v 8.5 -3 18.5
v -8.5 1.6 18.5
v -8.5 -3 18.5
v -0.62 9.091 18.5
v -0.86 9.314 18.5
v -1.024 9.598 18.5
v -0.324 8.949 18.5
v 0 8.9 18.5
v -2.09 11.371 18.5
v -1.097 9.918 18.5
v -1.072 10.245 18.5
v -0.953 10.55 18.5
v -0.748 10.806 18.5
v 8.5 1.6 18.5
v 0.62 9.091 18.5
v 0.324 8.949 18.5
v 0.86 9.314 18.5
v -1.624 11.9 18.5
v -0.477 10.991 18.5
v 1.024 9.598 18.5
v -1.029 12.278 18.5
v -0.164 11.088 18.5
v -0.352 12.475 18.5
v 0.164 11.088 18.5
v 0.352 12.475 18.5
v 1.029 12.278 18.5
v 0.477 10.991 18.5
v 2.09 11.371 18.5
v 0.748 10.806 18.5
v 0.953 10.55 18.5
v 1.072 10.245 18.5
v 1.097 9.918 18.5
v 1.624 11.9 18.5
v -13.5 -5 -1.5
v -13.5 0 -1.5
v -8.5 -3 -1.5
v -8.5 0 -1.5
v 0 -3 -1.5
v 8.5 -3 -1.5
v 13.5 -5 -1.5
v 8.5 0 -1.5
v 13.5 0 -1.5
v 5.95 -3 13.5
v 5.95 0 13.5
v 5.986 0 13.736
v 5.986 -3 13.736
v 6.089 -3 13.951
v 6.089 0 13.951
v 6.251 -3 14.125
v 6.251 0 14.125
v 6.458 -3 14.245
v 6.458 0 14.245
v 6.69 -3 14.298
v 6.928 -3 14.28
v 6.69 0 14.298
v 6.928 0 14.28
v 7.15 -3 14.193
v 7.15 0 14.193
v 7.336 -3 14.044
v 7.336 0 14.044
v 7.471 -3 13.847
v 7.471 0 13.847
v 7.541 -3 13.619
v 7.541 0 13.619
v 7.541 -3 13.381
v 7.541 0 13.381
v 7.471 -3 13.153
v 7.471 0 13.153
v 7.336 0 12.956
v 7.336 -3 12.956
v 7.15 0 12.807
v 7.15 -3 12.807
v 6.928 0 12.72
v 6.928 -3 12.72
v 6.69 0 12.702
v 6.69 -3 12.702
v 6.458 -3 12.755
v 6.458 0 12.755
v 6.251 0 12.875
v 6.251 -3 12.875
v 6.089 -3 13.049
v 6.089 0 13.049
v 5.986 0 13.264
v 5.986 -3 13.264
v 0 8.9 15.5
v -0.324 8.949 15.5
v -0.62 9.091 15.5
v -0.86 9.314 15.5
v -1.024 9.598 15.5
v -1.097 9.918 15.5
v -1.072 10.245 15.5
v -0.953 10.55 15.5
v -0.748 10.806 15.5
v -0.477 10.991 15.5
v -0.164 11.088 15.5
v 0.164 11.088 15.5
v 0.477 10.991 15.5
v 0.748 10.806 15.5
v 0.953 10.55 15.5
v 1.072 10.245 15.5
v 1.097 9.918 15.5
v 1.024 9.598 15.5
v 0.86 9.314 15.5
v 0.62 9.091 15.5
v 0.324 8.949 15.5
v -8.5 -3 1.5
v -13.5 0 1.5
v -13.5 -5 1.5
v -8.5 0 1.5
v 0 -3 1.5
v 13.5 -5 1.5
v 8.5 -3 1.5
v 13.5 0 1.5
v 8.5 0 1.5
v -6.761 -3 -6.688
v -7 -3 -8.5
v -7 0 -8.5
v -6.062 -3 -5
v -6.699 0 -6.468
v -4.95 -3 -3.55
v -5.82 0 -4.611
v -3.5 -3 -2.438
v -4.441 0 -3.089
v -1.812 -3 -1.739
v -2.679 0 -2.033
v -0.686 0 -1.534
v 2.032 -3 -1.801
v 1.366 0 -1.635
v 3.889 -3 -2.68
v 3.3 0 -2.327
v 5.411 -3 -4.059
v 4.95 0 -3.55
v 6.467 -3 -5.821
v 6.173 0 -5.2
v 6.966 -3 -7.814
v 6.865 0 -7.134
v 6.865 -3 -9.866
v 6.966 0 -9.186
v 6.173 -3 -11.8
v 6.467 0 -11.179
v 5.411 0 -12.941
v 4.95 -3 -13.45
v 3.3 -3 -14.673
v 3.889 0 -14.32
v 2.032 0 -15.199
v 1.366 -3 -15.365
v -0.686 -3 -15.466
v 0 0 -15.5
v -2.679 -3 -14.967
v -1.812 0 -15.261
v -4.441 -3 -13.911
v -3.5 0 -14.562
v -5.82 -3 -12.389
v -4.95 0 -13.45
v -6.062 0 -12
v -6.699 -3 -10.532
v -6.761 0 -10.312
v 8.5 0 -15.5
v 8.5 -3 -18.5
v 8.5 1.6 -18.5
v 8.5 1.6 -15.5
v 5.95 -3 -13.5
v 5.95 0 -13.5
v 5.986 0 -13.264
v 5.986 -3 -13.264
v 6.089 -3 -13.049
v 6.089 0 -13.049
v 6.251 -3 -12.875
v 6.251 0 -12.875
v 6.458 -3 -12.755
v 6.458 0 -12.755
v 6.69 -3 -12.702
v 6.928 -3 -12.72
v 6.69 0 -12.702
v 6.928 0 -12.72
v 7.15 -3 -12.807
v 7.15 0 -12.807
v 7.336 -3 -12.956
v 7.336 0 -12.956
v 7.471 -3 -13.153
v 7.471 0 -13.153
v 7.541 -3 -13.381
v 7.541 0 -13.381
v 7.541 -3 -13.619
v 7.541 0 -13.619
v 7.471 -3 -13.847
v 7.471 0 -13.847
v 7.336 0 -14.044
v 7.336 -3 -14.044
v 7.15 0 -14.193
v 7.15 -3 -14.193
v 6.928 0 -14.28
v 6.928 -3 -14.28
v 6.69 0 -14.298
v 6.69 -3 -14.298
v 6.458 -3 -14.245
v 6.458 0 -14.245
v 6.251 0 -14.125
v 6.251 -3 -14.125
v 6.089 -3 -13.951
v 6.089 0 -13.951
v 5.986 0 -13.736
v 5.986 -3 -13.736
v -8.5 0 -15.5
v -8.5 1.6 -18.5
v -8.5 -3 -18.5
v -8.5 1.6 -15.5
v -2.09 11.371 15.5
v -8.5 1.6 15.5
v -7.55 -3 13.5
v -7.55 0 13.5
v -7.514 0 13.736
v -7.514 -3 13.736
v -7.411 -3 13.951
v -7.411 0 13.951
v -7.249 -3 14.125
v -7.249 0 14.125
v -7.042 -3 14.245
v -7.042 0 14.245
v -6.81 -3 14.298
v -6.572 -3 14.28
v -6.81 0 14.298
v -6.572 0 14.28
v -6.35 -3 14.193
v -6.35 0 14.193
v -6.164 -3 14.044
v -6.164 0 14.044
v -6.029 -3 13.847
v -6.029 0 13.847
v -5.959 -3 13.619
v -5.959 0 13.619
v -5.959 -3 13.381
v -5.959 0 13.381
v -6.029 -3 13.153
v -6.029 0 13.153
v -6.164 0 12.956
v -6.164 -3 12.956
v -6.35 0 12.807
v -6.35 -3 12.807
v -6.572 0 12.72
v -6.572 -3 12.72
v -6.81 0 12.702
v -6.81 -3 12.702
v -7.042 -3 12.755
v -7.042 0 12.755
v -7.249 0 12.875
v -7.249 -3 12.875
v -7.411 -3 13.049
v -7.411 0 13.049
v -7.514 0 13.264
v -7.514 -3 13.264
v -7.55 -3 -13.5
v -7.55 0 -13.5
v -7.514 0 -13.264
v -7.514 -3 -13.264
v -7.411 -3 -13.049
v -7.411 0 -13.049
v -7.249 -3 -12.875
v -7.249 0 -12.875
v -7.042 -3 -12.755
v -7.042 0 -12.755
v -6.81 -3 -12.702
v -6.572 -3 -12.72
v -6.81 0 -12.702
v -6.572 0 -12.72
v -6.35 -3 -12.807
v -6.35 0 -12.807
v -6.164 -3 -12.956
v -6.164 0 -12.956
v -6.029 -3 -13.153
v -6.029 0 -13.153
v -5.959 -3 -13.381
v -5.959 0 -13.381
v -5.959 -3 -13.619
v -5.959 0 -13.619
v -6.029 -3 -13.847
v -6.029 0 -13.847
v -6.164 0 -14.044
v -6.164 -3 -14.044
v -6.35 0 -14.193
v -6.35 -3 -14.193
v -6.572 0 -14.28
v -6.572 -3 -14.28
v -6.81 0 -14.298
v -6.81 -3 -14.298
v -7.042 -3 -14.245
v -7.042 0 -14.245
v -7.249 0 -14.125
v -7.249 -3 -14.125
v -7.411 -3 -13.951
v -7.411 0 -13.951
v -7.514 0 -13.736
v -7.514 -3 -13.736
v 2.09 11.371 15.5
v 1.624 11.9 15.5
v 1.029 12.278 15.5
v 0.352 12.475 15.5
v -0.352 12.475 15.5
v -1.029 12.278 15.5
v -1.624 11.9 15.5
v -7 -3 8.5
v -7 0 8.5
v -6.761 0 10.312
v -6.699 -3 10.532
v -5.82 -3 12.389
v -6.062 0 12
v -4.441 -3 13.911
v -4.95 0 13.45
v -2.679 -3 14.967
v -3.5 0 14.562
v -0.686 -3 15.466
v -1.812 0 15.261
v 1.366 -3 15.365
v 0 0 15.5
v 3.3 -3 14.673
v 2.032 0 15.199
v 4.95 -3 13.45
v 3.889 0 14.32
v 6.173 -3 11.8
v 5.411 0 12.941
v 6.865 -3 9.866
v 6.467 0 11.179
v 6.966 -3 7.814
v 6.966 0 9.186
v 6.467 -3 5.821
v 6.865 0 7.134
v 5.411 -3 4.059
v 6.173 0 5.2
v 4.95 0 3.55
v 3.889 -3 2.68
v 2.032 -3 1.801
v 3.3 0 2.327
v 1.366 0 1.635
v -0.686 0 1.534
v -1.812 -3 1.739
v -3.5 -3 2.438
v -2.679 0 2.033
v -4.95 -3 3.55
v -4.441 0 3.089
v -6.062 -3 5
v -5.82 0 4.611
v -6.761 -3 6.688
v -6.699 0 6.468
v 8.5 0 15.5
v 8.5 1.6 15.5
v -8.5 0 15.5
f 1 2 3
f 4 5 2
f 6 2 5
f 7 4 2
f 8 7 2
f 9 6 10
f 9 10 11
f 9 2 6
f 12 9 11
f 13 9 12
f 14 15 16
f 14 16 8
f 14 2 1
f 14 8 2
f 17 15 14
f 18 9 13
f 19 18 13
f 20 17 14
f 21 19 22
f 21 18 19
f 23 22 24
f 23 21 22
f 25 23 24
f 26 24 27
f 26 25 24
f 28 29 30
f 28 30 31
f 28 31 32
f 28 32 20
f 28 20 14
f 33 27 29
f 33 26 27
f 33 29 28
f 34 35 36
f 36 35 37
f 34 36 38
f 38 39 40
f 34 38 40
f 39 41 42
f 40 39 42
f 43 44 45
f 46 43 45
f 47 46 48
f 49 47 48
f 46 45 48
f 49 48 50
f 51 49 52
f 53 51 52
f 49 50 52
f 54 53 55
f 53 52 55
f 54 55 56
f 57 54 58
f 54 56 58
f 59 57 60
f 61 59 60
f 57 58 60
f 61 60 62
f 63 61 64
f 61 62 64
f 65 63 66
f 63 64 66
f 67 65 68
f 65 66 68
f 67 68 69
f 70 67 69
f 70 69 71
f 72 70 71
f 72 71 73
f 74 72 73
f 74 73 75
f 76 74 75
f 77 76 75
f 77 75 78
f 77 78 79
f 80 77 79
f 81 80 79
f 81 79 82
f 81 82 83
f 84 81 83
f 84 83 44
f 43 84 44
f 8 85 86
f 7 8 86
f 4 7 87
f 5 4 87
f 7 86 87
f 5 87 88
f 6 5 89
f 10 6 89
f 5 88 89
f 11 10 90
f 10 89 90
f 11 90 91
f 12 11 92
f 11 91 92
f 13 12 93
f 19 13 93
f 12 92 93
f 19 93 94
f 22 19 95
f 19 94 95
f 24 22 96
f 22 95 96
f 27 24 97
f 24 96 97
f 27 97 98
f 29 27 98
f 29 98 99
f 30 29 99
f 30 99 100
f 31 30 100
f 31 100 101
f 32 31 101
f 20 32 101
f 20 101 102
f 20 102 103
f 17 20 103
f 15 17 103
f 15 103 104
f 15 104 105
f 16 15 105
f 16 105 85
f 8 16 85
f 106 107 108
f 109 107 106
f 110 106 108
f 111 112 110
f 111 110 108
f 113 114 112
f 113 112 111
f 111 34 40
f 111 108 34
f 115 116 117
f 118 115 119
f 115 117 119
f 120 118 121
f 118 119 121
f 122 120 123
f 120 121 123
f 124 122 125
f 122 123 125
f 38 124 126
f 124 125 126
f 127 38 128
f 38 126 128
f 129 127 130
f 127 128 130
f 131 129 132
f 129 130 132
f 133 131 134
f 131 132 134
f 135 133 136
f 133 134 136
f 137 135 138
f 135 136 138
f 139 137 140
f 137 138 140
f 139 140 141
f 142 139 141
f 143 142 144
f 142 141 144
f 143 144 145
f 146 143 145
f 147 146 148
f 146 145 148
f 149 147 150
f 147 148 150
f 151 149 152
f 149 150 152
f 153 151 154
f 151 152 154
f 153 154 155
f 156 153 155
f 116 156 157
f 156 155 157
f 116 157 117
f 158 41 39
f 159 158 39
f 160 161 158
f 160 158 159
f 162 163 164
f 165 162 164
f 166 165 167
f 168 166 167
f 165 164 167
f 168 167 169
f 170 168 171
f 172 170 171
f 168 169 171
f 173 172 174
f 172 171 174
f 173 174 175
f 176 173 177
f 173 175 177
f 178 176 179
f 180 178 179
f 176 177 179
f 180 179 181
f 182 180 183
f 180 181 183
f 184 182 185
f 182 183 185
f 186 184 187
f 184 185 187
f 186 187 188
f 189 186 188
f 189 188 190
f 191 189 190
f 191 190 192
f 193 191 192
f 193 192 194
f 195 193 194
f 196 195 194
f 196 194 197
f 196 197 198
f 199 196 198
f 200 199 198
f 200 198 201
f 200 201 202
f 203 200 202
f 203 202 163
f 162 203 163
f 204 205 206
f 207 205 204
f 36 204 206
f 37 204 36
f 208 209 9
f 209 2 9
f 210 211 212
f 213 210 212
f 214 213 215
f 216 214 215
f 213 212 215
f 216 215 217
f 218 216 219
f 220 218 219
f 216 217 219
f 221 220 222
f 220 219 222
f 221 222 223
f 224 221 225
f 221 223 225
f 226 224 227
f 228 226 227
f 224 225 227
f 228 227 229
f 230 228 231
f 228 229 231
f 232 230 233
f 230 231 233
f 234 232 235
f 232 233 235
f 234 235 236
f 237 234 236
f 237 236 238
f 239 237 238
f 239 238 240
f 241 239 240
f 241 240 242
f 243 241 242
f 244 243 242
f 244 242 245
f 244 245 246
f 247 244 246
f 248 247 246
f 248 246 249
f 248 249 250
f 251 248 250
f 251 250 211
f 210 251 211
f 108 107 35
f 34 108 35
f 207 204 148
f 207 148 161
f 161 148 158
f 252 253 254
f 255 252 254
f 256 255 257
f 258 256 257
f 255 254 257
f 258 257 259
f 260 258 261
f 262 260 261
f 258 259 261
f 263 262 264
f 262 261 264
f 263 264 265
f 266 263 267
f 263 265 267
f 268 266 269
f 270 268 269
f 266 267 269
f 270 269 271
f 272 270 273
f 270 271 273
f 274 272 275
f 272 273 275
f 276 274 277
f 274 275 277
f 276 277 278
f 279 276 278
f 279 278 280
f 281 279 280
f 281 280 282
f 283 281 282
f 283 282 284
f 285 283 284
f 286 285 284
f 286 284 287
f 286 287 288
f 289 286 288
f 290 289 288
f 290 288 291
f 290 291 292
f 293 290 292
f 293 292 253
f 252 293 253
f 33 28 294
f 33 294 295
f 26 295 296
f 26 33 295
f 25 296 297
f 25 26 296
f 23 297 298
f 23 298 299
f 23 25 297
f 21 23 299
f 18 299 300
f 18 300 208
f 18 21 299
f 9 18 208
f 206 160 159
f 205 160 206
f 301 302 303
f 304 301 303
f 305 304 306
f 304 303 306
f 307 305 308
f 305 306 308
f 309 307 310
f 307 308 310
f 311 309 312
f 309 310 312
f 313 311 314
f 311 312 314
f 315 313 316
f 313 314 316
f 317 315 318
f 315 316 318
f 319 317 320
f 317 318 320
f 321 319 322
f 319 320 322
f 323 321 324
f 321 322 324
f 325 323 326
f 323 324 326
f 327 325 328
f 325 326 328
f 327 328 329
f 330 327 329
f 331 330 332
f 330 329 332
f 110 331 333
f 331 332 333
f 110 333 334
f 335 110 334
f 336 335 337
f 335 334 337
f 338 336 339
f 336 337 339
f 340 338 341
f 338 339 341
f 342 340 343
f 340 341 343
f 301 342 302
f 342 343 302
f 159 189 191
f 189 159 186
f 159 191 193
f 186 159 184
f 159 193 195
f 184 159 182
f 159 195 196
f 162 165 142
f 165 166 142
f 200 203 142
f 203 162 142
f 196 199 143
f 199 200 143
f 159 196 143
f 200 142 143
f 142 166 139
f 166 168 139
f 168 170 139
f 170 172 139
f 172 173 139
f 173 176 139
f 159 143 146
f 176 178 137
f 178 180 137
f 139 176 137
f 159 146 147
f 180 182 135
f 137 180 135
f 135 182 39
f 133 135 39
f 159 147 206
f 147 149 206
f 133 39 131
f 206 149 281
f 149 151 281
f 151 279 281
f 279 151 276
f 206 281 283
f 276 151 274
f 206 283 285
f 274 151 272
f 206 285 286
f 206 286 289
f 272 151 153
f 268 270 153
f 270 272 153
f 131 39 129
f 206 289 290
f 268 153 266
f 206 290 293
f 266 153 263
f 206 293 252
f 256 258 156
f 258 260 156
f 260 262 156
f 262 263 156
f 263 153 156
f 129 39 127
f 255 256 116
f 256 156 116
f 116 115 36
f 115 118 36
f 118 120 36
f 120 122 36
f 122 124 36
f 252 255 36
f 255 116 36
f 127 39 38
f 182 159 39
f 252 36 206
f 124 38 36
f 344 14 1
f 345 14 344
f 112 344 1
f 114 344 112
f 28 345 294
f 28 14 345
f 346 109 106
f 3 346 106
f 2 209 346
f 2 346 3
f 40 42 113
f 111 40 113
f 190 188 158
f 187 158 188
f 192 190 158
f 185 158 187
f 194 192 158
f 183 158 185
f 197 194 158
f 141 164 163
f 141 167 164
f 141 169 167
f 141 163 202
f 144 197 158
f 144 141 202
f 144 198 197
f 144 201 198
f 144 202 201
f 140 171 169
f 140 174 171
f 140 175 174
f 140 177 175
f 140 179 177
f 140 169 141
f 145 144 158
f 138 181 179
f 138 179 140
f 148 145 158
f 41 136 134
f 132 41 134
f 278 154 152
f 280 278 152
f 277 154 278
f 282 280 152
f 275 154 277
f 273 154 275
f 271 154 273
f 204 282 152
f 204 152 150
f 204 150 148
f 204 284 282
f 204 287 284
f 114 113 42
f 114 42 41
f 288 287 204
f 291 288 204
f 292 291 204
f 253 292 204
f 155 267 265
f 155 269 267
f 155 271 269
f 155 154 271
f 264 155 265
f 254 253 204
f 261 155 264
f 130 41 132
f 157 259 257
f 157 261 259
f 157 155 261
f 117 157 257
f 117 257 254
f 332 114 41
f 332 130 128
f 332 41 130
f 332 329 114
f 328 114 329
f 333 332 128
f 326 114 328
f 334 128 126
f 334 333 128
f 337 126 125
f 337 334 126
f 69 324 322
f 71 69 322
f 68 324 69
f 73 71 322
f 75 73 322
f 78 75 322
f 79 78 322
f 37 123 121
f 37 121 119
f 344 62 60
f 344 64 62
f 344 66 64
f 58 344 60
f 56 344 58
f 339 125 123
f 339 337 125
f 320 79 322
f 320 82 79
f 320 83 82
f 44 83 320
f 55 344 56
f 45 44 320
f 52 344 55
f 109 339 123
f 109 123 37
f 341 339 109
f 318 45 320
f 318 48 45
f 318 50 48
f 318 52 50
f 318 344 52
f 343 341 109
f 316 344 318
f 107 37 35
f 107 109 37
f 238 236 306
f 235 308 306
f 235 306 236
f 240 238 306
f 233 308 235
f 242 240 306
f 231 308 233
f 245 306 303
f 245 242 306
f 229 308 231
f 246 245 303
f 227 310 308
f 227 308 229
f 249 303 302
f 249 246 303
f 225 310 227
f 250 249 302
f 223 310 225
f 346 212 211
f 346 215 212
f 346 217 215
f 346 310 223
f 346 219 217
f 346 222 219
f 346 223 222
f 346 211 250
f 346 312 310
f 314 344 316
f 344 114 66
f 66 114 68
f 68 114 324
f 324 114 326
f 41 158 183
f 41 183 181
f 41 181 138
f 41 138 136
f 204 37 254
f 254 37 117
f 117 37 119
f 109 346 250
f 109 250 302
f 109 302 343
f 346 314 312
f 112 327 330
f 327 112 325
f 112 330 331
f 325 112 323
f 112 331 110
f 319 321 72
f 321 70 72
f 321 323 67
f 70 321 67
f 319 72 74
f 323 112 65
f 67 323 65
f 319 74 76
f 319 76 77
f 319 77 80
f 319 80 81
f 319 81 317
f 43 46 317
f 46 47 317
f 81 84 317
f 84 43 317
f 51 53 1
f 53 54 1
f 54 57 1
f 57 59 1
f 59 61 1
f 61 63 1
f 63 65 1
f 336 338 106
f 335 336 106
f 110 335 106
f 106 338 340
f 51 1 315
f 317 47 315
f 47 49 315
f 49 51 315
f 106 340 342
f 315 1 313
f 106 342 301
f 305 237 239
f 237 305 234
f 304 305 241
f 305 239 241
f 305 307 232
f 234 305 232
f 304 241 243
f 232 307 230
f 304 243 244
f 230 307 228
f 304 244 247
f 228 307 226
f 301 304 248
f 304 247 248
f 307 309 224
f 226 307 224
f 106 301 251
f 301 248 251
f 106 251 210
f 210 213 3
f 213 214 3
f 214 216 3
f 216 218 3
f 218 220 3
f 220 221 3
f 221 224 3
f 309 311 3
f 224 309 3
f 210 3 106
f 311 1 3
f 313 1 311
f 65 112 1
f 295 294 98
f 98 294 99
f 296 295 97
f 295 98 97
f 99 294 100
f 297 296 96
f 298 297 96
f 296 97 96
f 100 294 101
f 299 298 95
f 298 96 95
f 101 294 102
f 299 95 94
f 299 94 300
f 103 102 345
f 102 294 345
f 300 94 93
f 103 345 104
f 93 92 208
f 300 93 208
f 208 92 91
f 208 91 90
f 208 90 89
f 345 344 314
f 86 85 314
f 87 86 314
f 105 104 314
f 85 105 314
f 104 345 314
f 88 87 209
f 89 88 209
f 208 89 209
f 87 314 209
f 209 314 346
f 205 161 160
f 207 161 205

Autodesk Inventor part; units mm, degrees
ref_plane "YZ Plane" through (0, 0, 0) normal (1, 0, 0) x (0, 1, 0)
ref_plane "XZ Plane" through (0, 0, 0) normal (0, 1, 0) x (-1, 0, 0)
ref_plane "XY Plane" through (0, 0, 0) normal (0, 0, 1) x (1, 0, 0)
sketch "スケッチ1" plane through (0, 0, 0) normal (0, 1, 0) x (-1, 0, 0)
  line L0 (8.5, 15.5) -> (-8.5, 15.5) construction
  line L1 (-8.5, 15.5) -> (-8.5, -15.5)
  line L2 (-8.5, -15.5) -> (8.5, -15.5) construction
  line L3 (8.5, -15.5) -> (8.5, 15.5)
  circle A0 centre (0, 8.5) radius 7
  circle A1 centre (0, -8.5) radius 7
  circle A2 centre (6.75, -13.5) radius 0.8
  line L4 (6.75, -13.5) -> (-6.75, -13.5) construction
  line L5 (-6.75, -13.5) -> (-6.75, 13.5) construction
  line L6 (-6.75, 13.5) -> (6.75, 13.5) construction
  line L7 (6.75, 13.5) -> (6.75, -13.5) construction
  circle A3 centre (-6.75, -13.5) radius 0.8
  circle A4 centre (6.75, 13.5) radius 0.8
  circle A5 centre (-6.75, 13.5) radius 0.8
  line L8 (8.5, 18.5) -> (-8.5, 18.5)
  line L9 (-8.5, 18.5) -> (-8.5, 15.5)
  line L10 (-8.5, 15.5) -> (8.5, 15.5)
  line L11 (8.5, 15.5) -> (8.5, 18.5)
  line L12 (8.5, -15.5) -> (-8.5, -15.5)
  line L13 (-8.5, -15.5) -> (-8.5, -18.5)
  line L14 (-8.5, -18.5) -> (8.5, -18.5)
  line L15 (8.5, -18.5) -> (8.5, -15.5)
  line L16 (-6.75, 10.354) -> (-6.75, -10.354)
  line L17 (13.5, -1.5) -> (-13.5, -1.5)
  line L18 (-13.5, -1.5) -> (-13.5, 1.5)
  line L19 (-13.5, 1.5) -> (13.5, 1.5)
  line L20 (13.5, 1.5) -> (13.5, -1.5)
  point P0 (0, 0)
  point P1 (0, 0)
  point P2 (0, 15.5)
  point P3 (8.5, 0)
  point P4 (6.75, 0)
  point P5 (0, 13.5)
  point P6 (6.75, 10.354)
  point P7 (6.75, -10.354)
  point P8 (7, 8.5)
  point P9 (7, -8.5)
  point P10 (-7, 8.5)
  point P11 (-7, -8.5)
  point P12 (-6.75, -6.646)
  point P13 (-6.75, 6.646)
  point P14 (13.5, 0)
  point P15 (0, -1.5)
  point P16 (8.5, 1.5)
  point P17 (8.5, -1.5)
  point P18 (-8.5, -1.5)
  point P19 (-8.5, 1.5)
  dimension "d0" = 17
  dimension "d1" = 31
  dimension "d2" = 14
  dimension "d4" = 27
  dimension "d5" = 13.5
  dimension "d7" = 1.6
  dimension "d9" = 3
  dimension "d26" = 5
extrude "押し出し1" add sketch "スケッチ1" against normal blind 3 contours L10 A0 L16 L19 L1 | L9 L8 L11 L10 | L19 L16 L17 L1 | L1 L17 L18 L19 | L10 L3 L19 A0 | L17 L16 A1 L12 L1 | L19 L3 L17 L16 | L16 A0 L19 | L12 L15 L14 L13 | L17 A1 L16 | L19 L20 L17 L3 | A1 L17 L3 L12
extrude "押し出し2" add sketch "スケッチ1" along normal blind 1.6 contours L9 L8 L11 L10 | L12 L15 L14 L13
sketch "スケッチ4" plane through (0, -3, 0) normal (0, -1, 0) x (1, 0, 0)
  line L0 (-8.5, 1.5) -> (-13.5, 1.5) projected
  line L1 (-13.5, 1.5) -> (-13.5, -1.5) projected
  line L2 (-13.5, -1.5) -> (-8.5, -1.5) projected
  line L3 (8.5, -1.5) -> (13.5, -1.5) projected
  line L4 (13.5, -1.5) -> (13.5, 1.5) projected
  line L5 (13.5, 1.5) -> (8.5, 1.5) projected
  line L6 (-13.5, -1.5) -> (13.5, -1.5) projected
  line L7 (-8.5, 1.5) -> (-13.5, 1.5) projected
  line L8 (-13.5, 1.5) -> (13.5, 1.5)
  line L9 (13.5, 1.5) -> (13.5, -1.5)
  line L10 (13.5, -1.5) -> (-13.5, -1.5)
  line L11 (-13.5, -1.5) -> (-13.5, 1.5)
  point P0 (-7, -1.5)
  point P1 (7, -1.5)
  point P2 (7, 1.5)
  point P3 (-7, 1.5)
  point P4 (0, 0)
  point P5 (-8.5, -1.5)
  point P6 (7, -1.5)
  point P7 (8.5, -1.5)
  point P8 (8.5, 1.5)
  point P9 (-7, 1.5)
extrude "押し出し4" add sketch "スケッチ4" along normal blind 2
sketch "スケッチ2" plane through (-8.5, -3, 18.5) normal (0, 0, 1) x (1, 0, 0)
  line L0 (0, 4.6) -> (17, 4.6) projected
  circle A0 centre (8.5, 13) radius 2.5
  line L1 (17, 4.6) -> (0, 4.6) projected
  line L2 (0, 4.6) -> (6.4096, 14.3712)
  line L3 (17, 4.6) -> (10.5904, 14.3712)
  point P0 (8.5, 3)
  dimension "d14" = 10
  dimension "d15" = 5
extrude "押し出し3" add sketch "スケッチ2" against normal up to surface (3 mm away)
sketch "スケッチ3" plane through (-8.5, -3, 18.5) normal (0, 0, 1) x (1, 0, 0)
  arc A0 (10.5904, 14.3712) -> (6.4096, 14.3712) centre (8.5, 13) ccw projected
  point P0 (8.5, 3)
hole "穴1" at (0, 10, 18.5) direction (0, 0, -1) diameter 2.2 end through all
properties part number "Ultrasonic_holderV3"
